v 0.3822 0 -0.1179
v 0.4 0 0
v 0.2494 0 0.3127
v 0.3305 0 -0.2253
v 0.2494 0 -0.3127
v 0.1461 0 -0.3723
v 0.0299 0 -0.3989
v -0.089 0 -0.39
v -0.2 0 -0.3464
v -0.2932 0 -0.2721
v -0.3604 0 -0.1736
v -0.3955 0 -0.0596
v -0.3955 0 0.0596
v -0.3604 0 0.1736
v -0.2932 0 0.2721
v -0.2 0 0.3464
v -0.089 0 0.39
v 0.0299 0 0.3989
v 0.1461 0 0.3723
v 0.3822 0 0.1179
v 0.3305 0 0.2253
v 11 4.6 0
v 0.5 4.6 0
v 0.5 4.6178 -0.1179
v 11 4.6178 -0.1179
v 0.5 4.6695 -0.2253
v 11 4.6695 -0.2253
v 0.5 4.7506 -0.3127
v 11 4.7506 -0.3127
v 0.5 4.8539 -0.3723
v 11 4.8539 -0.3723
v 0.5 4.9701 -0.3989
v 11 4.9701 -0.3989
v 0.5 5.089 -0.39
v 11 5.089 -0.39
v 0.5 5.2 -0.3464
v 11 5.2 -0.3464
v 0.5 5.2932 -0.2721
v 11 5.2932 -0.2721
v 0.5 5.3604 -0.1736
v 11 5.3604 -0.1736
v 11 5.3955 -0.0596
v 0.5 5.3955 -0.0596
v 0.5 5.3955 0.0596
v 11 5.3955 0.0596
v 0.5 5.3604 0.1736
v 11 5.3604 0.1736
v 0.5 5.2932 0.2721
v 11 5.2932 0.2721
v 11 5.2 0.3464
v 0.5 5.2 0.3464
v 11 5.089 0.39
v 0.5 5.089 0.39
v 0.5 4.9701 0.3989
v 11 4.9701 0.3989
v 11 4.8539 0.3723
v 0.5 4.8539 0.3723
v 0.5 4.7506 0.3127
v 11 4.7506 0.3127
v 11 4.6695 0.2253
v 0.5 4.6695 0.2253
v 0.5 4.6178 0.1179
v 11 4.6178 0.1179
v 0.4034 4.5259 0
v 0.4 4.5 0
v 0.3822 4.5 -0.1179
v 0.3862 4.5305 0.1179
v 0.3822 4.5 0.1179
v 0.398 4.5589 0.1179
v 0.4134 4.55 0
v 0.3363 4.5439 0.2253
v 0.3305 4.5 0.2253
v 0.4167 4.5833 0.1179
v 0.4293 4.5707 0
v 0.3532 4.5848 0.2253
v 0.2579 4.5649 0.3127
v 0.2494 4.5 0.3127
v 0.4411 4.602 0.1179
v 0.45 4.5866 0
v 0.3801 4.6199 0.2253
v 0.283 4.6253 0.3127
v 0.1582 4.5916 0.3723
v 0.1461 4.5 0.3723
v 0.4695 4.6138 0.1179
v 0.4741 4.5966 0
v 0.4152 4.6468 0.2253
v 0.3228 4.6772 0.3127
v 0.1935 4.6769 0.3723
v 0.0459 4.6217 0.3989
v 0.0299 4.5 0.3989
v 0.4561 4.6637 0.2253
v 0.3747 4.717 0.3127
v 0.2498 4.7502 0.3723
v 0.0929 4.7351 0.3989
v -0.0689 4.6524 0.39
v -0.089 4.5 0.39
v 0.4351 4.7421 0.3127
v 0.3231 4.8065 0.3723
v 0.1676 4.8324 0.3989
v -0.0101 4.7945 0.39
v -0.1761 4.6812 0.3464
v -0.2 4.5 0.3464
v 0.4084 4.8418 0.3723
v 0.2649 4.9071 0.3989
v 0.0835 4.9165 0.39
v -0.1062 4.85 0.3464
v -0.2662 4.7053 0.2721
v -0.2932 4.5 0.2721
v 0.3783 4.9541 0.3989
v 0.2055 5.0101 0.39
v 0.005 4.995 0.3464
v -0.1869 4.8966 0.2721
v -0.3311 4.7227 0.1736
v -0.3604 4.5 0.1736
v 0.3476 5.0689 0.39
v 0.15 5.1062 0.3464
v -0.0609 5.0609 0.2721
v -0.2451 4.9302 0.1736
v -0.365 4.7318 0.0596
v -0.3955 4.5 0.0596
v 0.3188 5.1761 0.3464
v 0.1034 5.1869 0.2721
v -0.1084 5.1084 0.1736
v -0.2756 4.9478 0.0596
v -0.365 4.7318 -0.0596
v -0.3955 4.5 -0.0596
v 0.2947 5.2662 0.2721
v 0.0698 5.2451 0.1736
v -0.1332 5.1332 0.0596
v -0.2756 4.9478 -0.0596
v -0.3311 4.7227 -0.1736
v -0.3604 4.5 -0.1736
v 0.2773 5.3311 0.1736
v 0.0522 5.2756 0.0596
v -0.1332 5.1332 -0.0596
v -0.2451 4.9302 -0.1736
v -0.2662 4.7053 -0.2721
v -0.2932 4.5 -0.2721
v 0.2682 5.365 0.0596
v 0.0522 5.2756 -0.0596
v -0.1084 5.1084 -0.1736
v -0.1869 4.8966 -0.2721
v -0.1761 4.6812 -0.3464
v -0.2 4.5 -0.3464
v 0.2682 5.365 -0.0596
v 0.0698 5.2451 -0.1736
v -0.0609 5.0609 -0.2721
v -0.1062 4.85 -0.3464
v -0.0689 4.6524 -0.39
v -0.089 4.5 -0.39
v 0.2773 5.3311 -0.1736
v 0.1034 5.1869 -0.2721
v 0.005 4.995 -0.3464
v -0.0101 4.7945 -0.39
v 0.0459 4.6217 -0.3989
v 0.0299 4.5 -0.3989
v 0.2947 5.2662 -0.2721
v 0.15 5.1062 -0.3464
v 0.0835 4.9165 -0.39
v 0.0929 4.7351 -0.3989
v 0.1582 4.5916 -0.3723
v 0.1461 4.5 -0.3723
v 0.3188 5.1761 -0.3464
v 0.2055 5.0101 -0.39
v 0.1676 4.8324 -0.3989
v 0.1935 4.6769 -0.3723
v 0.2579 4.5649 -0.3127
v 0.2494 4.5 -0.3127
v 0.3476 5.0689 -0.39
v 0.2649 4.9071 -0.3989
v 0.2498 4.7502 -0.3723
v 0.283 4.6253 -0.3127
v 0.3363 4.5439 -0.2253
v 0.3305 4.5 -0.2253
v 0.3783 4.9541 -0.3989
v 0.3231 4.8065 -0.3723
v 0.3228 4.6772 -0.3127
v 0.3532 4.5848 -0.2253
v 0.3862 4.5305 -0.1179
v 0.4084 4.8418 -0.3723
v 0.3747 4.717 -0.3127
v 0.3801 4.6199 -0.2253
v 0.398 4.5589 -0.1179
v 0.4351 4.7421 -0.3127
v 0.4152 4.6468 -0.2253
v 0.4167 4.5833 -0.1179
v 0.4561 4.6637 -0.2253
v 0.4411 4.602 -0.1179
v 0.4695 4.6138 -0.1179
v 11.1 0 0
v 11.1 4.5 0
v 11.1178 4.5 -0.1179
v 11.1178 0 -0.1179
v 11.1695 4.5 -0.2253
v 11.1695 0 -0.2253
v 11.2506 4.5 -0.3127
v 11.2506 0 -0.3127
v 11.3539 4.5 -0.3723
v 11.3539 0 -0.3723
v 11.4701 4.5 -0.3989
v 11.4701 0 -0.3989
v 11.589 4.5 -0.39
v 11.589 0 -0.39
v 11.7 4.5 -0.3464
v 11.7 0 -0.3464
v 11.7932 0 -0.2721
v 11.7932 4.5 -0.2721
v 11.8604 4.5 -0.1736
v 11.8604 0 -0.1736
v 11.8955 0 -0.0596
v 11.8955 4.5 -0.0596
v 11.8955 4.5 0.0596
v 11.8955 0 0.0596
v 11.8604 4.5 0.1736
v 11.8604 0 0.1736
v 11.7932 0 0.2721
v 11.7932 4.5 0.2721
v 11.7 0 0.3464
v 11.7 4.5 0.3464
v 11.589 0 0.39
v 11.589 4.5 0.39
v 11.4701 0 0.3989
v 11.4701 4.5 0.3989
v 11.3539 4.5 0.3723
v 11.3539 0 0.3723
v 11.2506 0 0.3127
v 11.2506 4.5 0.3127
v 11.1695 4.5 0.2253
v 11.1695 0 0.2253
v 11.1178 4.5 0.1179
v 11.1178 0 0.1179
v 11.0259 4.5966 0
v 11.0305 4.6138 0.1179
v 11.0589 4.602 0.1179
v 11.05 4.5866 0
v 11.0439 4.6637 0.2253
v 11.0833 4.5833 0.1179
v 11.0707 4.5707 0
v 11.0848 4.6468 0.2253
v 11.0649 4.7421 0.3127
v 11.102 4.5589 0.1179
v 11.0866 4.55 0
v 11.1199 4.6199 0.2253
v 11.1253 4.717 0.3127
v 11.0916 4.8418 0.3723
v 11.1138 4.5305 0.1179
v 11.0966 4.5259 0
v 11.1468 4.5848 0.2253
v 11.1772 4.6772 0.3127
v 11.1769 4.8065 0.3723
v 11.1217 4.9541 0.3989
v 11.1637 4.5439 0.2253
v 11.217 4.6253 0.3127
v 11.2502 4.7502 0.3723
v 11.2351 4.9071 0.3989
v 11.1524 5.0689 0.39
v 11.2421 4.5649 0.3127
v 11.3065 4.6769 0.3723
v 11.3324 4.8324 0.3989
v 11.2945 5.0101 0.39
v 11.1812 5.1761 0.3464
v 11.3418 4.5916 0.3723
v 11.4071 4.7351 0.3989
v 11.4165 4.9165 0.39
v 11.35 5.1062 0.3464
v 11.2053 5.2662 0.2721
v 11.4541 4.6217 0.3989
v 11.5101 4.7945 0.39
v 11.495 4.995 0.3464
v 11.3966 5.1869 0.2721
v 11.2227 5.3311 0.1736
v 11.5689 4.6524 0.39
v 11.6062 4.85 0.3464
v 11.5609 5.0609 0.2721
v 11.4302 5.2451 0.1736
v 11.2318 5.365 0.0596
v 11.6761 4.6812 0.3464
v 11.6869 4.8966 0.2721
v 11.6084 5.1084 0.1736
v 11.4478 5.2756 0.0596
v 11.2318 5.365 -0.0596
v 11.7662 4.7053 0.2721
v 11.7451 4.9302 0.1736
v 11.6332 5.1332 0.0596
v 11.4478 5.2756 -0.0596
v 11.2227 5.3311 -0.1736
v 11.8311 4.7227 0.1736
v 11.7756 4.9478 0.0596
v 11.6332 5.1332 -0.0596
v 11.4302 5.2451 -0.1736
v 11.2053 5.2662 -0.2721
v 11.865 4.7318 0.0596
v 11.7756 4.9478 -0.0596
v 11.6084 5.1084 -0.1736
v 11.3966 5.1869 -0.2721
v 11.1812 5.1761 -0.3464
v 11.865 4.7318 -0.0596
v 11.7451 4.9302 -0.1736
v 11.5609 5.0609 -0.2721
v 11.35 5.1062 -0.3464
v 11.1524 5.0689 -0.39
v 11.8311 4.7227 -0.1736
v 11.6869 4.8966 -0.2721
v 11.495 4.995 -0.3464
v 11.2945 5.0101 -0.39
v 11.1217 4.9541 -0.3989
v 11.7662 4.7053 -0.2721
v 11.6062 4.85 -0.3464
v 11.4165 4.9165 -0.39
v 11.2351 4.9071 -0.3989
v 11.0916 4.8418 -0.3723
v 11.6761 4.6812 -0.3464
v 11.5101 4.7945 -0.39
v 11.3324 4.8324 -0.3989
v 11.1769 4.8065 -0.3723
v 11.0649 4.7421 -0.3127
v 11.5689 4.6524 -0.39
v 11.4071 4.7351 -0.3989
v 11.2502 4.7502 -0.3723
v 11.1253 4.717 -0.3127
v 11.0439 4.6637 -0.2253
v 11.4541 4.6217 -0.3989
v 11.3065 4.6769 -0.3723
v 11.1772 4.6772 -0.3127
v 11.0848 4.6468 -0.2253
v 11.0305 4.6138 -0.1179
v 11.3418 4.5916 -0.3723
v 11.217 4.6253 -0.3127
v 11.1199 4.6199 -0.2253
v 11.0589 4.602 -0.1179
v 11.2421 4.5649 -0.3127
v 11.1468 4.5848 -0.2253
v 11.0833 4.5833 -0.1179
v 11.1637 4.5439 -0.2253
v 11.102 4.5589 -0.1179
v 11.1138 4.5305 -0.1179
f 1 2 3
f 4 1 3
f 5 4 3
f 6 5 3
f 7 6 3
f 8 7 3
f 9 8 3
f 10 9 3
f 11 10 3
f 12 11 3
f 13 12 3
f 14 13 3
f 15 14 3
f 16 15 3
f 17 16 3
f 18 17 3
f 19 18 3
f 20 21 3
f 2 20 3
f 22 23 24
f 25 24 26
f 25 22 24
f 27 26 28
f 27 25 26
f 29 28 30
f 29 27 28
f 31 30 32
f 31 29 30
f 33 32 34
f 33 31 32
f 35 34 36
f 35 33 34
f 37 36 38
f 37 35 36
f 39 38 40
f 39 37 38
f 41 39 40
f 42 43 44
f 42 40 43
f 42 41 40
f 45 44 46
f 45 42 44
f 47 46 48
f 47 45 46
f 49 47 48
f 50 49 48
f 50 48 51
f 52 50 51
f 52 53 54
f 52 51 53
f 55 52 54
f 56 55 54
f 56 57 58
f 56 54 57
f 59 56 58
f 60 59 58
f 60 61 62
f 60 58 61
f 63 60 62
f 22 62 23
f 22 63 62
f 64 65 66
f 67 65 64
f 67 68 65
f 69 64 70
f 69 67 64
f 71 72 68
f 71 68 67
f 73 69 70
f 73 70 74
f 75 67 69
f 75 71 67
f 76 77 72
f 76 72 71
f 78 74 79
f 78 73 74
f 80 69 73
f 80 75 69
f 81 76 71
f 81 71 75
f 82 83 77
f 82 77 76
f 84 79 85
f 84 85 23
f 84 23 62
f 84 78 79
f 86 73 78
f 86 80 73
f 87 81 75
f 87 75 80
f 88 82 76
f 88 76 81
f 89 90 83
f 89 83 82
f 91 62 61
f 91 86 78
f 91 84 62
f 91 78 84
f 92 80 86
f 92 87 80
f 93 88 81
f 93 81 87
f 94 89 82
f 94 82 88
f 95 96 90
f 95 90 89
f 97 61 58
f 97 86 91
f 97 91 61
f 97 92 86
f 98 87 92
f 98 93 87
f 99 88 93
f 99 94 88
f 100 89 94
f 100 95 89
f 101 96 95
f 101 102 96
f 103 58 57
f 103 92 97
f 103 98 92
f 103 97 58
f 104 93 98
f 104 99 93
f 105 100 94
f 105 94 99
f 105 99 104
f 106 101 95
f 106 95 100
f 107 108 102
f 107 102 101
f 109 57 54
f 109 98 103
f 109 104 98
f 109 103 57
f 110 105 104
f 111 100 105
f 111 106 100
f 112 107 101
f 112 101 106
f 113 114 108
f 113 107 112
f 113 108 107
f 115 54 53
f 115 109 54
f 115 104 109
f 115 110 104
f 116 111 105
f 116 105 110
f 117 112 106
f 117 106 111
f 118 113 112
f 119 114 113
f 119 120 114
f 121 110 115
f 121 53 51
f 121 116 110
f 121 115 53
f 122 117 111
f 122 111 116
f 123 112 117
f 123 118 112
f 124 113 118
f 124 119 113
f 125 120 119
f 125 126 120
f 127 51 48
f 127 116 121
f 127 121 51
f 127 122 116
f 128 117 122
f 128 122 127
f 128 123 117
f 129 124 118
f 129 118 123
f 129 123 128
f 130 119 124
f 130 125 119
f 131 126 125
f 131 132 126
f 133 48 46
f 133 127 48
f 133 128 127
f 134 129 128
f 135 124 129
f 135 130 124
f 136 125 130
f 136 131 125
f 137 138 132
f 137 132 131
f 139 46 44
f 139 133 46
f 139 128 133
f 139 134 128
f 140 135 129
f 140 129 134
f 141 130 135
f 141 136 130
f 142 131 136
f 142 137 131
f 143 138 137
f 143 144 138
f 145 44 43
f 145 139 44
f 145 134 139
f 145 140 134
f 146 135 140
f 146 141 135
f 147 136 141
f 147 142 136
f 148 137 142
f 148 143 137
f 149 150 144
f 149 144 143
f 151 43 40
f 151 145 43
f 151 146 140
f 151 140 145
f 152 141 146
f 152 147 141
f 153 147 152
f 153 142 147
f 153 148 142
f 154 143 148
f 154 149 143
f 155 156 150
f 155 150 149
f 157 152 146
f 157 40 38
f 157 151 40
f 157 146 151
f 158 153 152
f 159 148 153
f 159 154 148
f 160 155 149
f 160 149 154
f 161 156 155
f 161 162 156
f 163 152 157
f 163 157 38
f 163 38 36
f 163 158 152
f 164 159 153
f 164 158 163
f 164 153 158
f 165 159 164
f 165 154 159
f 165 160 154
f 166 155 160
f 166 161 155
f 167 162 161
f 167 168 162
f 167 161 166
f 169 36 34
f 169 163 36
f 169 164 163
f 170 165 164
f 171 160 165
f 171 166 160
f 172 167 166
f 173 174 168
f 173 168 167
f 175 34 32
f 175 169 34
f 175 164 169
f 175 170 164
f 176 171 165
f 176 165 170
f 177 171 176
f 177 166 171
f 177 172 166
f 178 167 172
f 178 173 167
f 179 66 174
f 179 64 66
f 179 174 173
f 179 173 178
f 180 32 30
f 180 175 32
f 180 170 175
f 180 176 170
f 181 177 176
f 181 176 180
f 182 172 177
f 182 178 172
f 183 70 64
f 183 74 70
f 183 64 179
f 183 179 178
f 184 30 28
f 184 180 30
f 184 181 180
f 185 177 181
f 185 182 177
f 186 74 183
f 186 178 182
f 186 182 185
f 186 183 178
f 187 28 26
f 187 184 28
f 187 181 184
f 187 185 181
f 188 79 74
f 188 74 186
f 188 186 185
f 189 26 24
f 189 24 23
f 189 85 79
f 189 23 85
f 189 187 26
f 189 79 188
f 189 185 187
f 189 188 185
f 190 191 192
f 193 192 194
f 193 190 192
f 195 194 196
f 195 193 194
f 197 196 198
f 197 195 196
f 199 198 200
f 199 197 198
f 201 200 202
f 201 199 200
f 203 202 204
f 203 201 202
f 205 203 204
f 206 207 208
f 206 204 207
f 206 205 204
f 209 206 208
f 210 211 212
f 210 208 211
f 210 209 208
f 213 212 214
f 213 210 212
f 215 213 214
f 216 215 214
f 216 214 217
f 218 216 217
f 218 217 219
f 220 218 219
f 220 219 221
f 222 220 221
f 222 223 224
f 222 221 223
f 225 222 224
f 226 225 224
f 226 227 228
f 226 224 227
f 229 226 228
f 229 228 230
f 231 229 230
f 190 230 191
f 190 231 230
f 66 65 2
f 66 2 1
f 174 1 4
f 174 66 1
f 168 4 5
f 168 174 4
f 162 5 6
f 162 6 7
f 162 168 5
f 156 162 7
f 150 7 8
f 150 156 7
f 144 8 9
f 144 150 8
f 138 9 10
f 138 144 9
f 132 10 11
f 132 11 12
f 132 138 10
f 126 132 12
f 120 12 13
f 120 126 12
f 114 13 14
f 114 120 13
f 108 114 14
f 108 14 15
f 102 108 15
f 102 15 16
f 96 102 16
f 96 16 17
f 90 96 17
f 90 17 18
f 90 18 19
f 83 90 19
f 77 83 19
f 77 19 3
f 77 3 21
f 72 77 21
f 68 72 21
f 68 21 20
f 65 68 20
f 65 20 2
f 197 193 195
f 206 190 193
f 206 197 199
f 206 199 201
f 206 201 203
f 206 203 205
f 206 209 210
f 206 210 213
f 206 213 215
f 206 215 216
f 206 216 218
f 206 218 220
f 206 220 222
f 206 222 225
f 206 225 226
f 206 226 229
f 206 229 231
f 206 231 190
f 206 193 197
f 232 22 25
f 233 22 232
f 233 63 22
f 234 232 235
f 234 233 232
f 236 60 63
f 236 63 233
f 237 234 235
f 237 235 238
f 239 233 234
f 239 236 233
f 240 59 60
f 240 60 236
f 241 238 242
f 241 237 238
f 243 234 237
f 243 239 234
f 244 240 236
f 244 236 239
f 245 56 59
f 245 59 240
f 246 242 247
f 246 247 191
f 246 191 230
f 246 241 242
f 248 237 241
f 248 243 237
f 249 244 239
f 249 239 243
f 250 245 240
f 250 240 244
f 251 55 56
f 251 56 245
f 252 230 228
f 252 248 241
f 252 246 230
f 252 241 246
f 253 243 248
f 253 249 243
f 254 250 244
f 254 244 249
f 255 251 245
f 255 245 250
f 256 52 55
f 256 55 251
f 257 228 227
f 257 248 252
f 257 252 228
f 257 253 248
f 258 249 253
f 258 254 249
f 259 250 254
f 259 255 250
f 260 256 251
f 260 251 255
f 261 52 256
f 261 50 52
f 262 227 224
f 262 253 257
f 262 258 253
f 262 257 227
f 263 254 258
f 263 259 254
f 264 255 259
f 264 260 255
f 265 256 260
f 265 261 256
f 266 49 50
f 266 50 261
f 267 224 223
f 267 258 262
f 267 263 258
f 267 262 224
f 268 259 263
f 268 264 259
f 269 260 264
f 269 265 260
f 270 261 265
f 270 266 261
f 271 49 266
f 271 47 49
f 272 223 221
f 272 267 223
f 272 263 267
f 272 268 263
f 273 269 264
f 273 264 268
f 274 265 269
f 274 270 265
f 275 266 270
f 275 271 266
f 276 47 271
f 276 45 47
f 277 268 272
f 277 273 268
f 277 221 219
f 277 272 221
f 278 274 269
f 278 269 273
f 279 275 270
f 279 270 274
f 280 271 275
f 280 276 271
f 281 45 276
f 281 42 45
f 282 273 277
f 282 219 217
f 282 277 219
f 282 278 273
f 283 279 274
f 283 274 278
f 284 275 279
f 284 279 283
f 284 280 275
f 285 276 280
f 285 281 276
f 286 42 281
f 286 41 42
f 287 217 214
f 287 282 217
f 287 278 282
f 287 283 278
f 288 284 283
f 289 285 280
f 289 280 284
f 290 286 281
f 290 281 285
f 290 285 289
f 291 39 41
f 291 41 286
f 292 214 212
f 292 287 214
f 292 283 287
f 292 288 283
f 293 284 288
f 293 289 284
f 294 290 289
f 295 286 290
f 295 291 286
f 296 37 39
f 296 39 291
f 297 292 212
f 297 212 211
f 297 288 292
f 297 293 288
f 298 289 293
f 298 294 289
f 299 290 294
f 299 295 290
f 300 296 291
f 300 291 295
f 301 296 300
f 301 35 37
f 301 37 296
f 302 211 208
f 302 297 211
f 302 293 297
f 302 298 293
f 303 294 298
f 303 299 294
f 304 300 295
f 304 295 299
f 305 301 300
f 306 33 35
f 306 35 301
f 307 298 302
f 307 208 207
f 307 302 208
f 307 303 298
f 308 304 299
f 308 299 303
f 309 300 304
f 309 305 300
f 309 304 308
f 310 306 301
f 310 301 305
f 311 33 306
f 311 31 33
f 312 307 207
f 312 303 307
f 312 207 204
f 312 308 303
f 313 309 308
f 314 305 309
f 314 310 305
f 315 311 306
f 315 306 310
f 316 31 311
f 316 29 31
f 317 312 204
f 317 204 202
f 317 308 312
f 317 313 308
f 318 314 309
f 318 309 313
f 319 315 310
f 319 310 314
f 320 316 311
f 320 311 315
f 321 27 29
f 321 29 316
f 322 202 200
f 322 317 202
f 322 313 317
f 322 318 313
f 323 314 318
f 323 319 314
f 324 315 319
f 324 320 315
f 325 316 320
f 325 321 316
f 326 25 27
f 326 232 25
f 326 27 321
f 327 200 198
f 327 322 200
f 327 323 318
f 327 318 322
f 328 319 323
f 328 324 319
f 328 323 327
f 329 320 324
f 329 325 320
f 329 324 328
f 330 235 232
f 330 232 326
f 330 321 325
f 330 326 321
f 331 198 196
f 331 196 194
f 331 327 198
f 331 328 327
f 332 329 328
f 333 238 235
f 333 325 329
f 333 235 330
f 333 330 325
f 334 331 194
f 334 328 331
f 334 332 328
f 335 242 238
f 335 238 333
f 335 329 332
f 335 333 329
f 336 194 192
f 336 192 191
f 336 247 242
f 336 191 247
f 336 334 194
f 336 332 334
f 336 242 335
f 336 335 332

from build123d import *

# Parameters (mm, degrees)
SKETCH1_R = 0.4


with BuildPart() as part:
    # Sweep1: sweep along a path in Sketch4
    with BuildLine(Plane.XY) as sweep1_path:
        Line((0, 0), (0, 4.5))
        ThreePointArc((0, 4.5), (0.146446609, 4.853553391), (0.5, 5))
        Line((0.5, 5), (11, 5))
        ThreePointArc((11, 5), (11.353553391, 4.853553391), (11.5, 4.5))
        Line((11.5, 4.5), (11.5, 0))
    # Sketch1 → Sweep1 (sweep)
    with BuildSketch(Plane(origin=(0, 0, 0), x_dir=(1, 0, 0), z_dir=(0, 1, 0))):
        Circle(SKETCH1_R)
    sweep(path=sweep1_path.line)


solid = part.part
